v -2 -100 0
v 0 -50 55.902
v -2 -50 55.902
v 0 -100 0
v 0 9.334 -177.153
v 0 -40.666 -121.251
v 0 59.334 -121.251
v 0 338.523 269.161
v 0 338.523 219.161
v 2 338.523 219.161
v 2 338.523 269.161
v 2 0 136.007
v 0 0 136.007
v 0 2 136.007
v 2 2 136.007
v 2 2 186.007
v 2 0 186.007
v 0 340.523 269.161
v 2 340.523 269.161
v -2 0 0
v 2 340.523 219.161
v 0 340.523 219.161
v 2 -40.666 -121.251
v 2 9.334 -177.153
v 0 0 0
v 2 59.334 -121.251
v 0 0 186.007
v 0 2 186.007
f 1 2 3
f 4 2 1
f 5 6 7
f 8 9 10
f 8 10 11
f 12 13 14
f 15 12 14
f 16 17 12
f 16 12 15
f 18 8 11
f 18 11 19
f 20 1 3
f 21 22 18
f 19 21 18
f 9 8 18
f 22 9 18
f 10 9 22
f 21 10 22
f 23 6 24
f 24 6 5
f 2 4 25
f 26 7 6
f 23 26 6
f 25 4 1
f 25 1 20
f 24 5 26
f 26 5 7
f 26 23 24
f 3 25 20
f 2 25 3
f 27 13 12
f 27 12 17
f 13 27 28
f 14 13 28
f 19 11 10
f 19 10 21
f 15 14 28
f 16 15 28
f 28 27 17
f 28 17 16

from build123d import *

# Parameters (mm, degrees)
F1_DEPTH = 2
F2_W     = 2
F2_H     = 50
F3_DEPTH = 2
F5_DEPTH = 2
F6_W     = 2
F6_H     = 50
F7_DEPTH = 2


with BuildPart() as f1:
    # F0 (on Right) → F1 (new body)
    with BuildSketch(Plane.YZ):
        Polygon((-100, 0), (0, 0), (-50, 55.901699), align=None)
    extrude(amount=-F1_DEPTH)


with BuildPart() as f3:
    # F2 (on Right) → F3 (new body)
    with BuildSketch(Plane.YZ):
        with Locations((1, 161.007334)):
            Rectangle(F2_W, F2_H)
    extrude(amount=F3_DEPTH)


with BuildPart() as f5:
    # F4 (on Right) → F5 (new body)
    with BuildSketch(Plane.YZ):
        Polygon((59.333722, -121.251218), (-40.666278, -121.251218), (9.333722, -177.152917), align=None)
    extrude(amount=F5_DEPTH)


with BuildPart() as f7:
    # F6 (on Right) → F7 (new body)
    with BuildSketch(Plane.YZ):
        with Locations((339.522574, 244.161454)):
            Rectangle(F6_W, F6_H)
    extrude(amount=F7_DEPTH)


solid = Compound([f1.part, f3.part, f5.part, f7.part])
